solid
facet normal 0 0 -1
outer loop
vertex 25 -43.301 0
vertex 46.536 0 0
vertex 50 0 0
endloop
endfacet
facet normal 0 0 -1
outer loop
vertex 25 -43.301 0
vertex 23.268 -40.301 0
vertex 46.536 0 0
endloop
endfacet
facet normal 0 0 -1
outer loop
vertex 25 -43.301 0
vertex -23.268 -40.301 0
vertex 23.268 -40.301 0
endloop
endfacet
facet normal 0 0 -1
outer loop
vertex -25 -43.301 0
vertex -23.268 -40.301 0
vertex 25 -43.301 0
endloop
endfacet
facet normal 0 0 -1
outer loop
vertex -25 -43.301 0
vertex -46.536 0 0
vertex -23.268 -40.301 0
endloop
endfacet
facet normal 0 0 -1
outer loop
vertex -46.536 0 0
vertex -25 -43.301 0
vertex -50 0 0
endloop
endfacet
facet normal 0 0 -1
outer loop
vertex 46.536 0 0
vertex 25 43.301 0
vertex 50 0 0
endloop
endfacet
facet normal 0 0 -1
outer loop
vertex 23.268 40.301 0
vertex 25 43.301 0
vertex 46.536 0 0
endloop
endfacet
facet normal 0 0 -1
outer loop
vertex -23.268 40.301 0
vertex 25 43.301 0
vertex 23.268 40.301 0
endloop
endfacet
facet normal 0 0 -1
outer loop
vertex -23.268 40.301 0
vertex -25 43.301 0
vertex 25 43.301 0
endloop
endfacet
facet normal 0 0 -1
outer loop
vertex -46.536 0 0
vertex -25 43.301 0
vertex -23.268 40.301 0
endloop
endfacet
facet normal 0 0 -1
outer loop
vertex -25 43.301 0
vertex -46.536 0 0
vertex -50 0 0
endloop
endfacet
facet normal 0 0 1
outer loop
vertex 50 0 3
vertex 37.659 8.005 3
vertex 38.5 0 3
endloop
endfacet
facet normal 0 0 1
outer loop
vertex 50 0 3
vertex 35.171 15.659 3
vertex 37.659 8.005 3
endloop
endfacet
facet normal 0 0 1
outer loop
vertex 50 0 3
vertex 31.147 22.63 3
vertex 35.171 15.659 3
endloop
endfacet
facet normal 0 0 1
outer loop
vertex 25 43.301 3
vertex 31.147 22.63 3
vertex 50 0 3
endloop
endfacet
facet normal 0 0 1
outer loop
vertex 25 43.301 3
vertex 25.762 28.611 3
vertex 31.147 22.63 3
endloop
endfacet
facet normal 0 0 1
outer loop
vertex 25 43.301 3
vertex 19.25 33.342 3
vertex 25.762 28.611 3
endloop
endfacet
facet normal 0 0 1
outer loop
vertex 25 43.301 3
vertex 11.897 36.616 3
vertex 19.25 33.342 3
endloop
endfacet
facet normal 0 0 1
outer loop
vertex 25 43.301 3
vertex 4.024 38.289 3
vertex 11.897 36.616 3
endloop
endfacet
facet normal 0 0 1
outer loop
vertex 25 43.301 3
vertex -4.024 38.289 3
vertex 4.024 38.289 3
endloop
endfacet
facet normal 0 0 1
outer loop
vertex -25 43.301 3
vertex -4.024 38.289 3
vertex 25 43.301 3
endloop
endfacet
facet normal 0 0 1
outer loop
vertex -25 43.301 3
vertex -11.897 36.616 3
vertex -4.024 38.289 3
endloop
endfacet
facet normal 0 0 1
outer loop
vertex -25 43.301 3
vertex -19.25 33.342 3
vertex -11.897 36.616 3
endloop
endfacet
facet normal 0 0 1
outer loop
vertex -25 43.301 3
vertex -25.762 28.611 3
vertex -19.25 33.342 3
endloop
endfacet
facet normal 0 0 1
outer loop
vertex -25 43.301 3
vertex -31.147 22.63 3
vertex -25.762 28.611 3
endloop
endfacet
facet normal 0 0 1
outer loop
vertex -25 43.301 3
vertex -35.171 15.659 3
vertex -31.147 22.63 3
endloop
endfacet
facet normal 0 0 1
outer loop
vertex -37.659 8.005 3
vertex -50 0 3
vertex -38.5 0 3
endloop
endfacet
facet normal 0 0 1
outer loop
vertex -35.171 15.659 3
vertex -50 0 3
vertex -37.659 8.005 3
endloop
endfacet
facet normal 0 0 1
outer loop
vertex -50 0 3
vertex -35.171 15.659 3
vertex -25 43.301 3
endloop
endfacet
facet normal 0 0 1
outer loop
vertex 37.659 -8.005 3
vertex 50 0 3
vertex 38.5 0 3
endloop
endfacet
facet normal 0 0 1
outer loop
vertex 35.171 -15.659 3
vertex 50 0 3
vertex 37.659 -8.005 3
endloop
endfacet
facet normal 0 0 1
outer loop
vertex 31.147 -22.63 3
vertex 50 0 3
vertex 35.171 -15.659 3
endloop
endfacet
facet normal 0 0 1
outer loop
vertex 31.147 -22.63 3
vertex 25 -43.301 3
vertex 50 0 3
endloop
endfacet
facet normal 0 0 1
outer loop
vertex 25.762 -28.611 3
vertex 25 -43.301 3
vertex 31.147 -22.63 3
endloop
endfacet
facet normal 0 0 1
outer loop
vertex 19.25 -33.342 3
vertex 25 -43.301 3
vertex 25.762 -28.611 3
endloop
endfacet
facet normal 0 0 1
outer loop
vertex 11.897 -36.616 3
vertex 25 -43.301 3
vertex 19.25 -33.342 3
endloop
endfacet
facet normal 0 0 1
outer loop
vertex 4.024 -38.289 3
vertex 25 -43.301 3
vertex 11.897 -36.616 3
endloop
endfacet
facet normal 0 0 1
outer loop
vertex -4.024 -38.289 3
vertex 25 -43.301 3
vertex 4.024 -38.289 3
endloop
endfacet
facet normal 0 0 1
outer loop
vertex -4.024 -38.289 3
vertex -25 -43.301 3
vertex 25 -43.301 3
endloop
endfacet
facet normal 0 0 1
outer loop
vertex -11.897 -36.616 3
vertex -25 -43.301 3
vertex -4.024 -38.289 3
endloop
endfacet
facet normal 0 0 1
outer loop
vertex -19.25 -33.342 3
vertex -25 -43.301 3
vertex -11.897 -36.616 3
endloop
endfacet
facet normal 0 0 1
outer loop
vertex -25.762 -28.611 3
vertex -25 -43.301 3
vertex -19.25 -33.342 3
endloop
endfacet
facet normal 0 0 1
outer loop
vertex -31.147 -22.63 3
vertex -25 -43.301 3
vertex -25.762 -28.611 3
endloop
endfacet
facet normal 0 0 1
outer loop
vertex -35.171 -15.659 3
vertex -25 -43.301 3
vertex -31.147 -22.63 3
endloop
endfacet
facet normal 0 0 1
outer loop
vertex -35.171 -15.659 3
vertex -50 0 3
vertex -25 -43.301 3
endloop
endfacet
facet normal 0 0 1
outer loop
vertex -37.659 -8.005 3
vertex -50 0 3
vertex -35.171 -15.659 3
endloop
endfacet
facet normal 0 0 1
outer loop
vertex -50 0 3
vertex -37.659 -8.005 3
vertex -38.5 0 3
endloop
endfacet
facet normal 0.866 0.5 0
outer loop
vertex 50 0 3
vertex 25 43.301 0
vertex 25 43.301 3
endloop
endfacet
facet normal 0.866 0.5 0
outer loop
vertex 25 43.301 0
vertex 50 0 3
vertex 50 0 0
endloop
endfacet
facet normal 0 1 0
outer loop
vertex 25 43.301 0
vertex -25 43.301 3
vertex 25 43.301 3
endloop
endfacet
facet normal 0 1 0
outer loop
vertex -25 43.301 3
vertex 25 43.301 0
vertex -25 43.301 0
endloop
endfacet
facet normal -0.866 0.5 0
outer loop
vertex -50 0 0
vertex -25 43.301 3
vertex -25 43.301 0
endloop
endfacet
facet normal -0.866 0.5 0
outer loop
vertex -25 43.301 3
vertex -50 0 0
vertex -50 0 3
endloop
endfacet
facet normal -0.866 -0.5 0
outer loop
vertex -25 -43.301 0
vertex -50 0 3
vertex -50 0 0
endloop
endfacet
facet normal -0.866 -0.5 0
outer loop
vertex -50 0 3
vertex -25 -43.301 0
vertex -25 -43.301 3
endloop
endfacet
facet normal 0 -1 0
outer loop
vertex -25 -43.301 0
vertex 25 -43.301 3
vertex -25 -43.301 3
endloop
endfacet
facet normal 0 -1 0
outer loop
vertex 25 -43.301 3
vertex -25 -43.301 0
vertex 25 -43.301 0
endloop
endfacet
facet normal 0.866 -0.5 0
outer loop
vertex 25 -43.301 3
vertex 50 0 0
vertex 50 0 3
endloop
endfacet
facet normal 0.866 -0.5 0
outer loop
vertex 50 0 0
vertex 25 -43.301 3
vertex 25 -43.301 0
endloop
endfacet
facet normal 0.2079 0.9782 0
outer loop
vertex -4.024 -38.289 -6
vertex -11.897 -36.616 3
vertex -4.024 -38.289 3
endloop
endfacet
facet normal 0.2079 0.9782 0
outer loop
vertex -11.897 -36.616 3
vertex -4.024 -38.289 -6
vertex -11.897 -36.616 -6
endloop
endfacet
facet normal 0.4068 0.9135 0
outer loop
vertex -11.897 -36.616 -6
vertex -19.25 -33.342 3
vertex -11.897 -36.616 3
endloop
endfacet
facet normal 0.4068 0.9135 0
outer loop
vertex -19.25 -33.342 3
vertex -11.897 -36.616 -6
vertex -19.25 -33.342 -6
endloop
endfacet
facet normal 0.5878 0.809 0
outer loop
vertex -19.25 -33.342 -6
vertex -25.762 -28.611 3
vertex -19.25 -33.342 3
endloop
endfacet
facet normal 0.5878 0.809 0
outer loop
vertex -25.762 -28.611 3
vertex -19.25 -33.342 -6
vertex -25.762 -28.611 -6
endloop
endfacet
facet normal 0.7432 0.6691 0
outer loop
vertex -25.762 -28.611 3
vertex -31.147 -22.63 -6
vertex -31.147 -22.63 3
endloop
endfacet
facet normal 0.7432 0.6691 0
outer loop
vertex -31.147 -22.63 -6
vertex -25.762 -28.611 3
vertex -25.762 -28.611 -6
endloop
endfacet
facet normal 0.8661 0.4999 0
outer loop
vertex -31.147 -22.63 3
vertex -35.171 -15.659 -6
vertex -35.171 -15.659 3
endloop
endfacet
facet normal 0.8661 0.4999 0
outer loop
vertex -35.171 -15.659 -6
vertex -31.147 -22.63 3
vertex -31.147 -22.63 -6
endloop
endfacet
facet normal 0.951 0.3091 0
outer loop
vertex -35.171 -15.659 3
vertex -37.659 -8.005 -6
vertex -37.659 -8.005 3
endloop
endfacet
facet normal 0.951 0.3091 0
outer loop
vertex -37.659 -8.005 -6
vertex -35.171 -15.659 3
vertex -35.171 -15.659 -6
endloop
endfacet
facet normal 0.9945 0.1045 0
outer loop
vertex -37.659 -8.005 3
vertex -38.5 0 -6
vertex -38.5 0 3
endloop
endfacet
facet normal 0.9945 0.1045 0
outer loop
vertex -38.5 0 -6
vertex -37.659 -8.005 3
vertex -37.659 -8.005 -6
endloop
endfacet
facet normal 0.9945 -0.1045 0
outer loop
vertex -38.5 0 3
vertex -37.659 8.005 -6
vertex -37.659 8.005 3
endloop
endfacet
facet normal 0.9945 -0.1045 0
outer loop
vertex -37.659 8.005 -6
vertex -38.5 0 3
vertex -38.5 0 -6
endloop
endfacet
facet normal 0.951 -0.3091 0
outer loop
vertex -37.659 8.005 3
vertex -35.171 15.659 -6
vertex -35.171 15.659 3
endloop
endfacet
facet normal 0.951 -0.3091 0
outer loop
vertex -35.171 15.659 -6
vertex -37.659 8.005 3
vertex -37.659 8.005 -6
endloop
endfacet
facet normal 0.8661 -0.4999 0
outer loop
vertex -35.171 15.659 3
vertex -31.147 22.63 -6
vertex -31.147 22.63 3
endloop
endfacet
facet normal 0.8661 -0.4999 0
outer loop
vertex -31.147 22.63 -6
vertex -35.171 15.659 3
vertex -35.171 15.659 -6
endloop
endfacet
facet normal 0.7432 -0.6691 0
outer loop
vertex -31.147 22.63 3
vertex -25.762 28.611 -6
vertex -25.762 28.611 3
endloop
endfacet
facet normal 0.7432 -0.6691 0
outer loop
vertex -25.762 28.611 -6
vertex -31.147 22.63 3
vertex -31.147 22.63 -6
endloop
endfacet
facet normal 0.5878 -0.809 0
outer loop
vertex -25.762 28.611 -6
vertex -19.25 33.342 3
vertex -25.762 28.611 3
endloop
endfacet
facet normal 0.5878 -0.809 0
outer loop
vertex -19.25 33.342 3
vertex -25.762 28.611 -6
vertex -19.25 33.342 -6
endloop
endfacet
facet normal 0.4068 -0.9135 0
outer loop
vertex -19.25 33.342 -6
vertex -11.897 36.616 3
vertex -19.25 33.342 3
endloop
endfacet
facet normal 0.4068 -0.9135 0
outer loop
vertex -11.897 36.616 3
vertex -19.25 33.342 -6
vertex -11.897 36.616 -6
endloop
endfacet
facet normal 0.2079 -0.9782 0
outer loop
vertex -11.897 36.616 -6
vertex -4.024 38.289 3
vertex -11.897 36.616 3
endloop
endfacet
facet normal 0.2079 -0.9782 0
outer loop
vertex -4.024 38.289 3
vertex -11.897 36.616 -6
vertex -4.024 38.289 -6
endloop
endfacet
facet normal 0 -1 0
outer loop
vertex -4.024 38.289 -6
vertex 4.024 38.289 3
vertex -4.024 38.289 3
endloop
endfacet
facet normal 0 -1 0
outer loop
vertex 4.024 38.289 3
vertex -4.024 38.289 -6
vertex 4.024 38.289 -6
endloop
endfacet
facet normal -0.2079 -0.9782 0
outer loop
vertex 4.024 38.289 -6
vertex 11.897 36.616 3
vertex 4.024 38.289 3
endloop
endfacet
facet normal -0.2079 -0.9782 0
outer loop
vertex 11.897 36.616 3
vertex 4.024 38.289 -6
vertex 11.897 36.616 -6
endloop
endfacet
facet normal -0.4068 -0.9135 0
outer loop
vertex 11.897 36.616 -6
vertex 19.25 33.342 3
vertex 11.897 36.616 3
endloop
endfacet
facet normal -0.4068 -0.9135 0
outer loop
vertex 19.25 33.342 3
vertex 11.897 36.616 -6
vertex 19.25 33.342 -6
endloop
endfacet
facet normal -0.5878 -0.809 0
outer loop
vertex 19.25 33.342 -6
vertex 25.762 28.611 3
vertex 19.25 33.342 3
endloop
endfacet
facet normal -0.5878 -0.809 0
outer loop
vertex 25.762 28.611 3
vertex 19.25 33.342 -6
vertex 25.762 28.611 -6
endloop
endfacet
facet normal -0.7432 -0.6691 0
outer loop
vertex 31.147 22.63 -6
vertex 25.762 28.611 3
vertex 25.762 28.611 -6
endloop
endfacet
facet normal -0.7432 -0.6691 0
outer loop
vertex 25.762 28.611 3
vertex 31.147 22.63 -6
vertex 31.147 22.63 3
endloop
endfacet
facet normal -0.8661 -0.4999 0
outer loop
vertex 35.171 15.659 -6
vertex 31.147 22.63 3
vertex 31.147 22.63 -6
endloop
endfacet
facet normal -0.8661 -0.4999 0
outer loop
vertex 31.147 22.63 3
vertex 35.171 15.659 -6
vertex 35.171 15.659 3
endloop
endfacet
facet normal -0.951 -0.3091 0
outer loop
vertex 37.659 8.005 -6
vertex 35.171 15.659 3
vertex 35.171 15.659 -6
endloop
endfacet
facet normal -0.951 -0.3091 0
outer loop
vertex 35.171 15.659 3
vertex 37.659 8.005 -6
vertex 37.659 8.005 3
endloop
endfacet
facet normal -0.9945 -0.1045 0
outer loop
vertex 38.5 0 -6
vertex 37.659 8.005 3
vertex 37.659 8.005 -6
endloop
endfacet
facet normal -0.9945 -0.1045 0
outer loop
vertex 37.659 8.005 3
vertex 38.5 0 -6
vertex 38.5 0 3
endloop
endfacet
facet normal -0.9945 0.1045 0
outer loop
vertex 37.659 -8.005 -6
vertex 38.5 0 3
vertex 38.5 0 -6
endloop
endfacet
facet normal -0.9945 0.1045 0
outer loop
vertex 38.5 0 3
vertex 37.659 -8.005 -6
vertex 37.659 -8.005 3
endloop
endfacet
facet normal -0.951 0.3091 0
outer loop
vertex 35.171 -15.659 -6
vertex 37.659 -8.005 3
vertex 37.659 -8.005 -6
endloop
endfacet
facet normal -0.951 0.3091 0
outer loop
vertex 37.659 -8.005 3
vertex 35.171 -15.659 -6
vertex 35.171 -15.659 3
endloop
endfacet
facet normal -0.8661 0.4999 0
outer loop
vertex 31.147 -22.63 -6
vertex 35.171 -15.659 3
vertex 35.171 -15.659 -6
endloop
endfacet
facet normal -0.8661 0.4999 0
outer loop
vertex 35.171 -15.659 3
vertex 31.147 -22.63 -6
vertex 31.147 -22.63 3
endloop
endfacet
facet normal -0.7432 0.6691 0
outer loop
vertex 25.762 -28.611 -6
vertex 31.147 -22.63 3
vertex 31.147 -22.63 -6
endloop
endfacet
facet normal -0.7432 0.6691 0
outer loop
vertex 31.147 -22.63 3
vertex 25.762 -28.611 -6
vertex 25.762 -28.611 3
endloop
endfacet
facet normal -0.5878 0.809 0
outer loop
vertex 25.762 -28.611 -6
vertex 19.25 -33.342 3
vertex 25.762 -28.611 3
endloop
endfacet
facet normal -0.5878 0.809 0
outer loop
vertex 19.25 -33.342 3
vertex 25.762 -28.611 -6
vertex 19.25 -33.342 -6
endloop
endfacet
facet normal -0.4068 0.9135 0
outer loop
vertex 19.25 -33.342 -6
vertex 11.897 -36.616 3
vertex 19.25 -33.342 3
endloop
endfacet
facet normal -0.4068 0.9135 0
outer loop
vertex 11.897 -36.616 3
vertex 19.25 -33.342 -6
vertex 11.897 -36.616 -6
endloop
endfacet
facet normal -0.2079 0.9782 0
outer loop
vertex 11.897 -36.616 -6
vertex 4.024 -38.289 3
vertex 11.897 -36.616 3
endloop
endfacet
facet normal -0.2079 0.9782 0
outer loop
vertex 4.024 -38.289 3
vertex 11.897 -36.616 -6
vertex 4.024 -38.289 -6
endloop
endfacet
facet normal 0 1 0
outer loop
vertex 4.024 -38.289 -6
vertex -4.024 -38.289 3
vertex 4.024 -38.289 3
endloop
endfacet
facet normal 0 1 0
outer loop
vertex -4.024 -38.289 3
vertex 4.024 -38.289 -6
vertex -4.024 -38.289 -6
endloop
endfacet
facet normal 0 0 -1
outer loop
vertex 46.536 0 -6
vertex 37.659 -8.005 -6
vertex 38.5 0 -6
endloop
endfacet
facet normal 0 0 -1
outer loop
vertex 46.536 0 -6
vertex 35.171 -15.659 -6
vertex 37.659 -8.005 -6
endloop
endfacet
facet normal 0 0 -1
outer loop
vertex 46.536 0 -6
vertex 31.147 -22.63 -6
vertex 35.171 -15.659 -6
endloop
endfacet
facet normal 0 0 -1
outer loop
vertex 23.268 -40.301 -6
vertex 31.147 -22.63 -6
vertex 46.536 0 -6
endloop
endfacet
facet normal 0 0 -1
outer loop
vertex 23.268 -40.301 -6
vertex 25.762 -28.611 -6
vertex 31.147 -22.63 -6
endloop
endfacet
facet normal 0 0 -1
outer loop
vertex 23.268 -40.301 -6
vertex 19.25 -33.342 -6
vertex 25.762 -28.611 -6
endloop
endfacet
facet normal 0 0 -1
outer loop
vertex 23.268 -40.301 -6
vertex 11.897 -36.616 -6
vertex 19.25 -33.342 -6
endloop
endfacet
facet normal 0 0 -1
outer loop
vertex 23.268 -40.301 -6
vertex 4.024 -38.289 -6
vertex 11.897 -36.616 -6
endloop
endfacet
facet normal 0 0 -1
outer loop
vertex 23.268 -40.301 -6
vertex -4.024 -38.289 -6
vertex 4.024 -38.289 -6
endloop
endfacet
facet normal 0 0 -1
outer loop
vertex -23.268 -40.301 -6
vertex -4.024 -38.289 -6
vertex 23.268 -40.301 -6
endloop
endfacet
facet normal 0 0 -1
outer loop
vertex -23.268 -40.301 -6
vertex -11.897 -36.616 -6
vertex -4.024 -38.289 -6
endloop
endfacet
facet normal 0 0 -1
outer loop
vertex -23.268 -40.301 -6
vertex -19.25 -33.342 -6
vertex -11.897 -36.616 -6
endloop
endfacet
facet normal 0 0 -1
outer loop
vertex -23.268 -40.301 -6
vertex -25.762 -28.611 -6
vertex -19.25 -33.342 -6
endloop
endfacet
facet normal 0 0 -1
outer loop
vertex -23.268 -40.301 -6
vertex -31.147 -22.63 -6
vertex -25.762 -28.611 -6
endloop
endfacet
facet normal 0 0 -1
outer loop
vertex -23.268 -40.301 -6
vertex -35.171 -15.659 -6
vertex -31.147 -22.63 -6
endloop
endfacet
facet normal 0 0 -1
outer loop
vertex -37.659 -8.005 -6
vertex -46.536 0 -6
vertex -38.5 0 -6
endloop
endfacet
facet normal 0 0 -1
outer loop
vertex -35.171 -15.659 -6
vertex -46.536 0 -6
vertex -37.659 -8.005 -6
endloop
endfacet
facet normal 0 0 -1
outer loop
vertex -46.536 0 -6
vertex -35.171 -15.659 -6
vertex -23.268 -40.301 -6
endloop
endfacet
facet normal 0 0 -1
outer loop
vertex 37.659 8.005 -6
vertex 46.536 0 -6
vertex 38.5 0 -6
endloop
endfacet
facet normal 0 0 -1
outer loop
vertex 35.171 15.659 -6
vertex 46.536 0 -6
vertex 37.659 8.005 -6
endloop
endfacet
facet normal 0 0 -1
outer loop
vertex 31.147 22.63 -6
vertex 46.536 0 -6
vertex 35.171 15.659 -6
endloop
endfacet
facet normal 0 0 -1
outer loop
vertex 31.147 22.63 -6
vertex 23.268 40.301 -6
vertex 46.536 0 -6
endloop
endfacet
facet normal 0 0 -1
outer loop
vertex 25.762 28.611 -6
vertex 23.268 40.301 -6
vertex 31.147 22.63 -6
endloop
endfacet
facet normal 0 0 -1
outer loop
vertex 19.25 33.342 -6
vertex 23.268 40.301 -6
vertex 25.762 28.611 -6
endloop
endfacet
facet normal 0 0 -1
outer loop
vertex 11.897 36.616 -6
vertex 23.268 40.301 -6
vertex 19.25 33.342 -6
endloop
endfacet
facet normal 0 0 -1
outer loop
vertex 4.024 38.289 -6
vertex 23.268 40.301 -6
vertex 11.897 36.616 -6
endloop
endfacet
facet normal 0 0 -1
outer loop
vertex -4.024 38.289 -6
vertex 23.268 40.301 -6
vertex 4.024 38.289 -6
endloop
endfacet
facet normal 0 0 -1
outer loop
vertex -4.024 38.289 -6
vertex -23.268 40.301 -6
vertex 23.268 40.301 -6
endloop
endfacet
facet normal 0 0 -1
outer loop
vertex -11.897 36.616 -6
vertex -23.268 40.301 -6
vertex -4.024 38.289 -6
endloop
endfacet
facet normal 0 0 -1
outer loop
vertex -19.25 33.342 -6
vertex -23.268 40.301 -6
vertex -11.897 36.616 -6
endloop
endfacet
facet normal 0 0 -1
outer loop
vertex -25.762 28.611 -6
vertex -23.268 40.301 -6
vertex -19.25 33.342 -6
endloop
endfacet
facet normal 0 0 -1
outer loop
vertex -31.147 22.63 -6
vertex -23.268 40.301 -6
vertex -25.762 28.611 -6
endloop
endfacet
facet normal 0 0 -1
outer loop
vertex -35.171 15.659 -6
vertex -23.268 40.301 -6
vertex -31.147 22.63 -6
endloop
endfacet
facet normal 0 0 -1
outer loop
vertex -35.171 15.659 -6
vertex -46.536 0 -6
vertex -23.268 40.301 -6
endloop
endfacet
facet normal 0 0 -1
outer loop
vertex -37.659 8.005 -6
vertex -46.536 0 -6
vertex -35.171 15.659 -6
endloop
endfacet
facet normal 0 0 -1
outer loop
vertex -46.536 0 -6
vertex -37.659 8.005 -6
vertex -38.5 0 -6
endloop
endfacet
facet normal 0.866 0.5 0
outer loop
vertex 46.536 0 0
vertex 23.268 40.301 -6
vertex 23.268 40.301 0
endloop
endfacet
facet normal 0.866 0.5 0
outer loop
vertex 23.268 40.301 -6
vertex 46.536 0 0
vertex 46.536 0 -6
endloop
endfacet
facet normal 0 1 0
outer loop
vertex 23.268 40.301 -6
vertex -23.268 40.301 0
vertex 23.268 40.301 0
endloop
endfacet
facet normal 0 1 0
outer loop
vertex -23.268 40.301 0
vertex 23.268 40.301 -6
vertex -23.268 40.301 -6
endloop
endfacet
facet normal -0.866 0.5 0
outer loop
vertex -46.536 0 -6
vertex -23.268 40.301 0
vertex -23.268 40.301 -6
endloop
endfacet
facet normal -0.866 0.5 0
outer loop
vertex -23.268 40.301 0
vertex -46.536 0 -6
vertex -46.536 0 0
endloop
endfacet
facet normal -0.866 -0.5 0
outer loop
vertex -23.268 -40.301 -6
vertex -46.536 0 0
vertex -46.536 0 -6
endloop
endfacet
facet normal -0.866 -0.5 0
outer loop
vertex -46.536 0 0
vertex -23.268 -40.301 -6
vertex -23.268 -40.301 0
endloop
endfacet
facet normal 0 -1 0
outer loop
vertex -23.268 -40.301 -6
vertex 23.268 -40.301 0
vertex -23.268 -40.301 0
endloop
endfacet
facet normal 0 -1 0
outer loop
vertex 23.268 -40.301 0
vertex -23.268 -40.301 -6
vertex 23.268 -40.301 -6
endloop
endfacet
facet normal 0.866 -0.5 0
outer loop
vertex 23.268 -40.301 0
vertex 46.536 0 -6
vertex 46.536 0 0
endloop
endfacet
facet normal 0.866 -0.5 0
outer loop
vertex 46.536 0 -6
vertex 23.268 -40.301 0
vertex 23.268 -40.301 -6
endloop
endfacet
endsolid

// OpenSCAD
$tol = 2;

$explode = 1.3;

container_diameter = 75;
container_height = 52;

block_height = 75;
block_size=100;

finger_hole = 25;

connector_height=6;
connector_thickness=3;

cap_thickness=3;

// extractor = 0 
// Riser = 1
// Cap = 2;



//extractor();
//riser();
cap();

//assembly();

module assembly() {
    components = [0, 1, 2];

    for(ix = [0:len(components)]) {
        translate([0, 0, ix*(block_height+connector_height+connector_height*$explode)]) {
            if(components[ix] == 0) { extractor(); }
            else if (components[ix] == 1) { riser(); }
            else if (components[ix] == 2) { cap() ; }
        }
    }
}


module extractor() {
    union() {
        top_connector();
        extraction_point();
        base_plate();
    }
}

module extraction_point() {    
    difference() {
        
        barrel();
        
        // Extraction Port
        linear_extrude(height = container_height+$tol) {
            translate([-(container_diameter+$tol)/2,-(container_diameter+$tol),0]) {
                square(container_diameter+$tol);
            }
        }

        // Finger Hole
        translate([0, finger_hole/2, container_height/2]) {
            rotate([0,90,0]) {
                linear_extrude(height=block_size, center=true) {
                    union() {
                        circle(d=finger_hole);
                        translate([-(finger_hole)/2, -(container_diameter+$tol)/2]) {
                            square([finger_hole, (container_diameter+$tol)/2]);
                        }
                    }
                }
            }
        }
    }
}

module cap() {
    union() {
        
        linear_extrude(height=cap_thickness) {
            barrel_profile();
        }
        
        bottom_connector();
    }
}

module riser() {
    union() {
        top_connector();
        difference() {
            barrel();
            
            rotate([90,0,0]) {
                translate([0,finger_hole,-block_size/2]) {
                    linear_extrude(height=block_size/2) {
                        circle(d=finger_hole);
                        
                        translate([-finger_hole/2,0]) {
                            square([finger_hole,block_size-3*finger_hole]);
                        }
                        
                        translate([0,block_size-3*finger_hole]) {
                            circle(d=finger_hole);
                        }
                    }
                }
            }
        }
        
        bottom_connector();
    }
}

module top_connector() {
    
    translate([0,0,block_height]) {
        linear_extrude(height=connector_height) {    
            difference() {
                barrel_profile();
                
                offset(-connector_thickness) {
                    base_profile();
                }
            }
        }
    }
}

module bottom_connector() {
    // Simple Slot Connection
    translate([0,0,-connector_height]) {    
        linear_extrude(height=connector_height) {    
            intersection() {
                barrel_profile();
                
                offset(-connector_thickness) {
                    base_profile();
                }
            }
        }
    }
}

module barrel() {
    
    difference() {
        linear_extrude(height = block_height) {
                barrel_profile();
        }
    }
}

module barrel_profile() {
    difference() {
        base_profile();
        circle(d=container_diameter+$tol);
    }
}

module base_plate() {
    translate([0,0,-cap_thickness]) {
        linear_extrude(height=cap_thickness) {
            base_profile();
        }
    }
}

module base_profile() {
    circle(d=block_size, $fn=6);
}
